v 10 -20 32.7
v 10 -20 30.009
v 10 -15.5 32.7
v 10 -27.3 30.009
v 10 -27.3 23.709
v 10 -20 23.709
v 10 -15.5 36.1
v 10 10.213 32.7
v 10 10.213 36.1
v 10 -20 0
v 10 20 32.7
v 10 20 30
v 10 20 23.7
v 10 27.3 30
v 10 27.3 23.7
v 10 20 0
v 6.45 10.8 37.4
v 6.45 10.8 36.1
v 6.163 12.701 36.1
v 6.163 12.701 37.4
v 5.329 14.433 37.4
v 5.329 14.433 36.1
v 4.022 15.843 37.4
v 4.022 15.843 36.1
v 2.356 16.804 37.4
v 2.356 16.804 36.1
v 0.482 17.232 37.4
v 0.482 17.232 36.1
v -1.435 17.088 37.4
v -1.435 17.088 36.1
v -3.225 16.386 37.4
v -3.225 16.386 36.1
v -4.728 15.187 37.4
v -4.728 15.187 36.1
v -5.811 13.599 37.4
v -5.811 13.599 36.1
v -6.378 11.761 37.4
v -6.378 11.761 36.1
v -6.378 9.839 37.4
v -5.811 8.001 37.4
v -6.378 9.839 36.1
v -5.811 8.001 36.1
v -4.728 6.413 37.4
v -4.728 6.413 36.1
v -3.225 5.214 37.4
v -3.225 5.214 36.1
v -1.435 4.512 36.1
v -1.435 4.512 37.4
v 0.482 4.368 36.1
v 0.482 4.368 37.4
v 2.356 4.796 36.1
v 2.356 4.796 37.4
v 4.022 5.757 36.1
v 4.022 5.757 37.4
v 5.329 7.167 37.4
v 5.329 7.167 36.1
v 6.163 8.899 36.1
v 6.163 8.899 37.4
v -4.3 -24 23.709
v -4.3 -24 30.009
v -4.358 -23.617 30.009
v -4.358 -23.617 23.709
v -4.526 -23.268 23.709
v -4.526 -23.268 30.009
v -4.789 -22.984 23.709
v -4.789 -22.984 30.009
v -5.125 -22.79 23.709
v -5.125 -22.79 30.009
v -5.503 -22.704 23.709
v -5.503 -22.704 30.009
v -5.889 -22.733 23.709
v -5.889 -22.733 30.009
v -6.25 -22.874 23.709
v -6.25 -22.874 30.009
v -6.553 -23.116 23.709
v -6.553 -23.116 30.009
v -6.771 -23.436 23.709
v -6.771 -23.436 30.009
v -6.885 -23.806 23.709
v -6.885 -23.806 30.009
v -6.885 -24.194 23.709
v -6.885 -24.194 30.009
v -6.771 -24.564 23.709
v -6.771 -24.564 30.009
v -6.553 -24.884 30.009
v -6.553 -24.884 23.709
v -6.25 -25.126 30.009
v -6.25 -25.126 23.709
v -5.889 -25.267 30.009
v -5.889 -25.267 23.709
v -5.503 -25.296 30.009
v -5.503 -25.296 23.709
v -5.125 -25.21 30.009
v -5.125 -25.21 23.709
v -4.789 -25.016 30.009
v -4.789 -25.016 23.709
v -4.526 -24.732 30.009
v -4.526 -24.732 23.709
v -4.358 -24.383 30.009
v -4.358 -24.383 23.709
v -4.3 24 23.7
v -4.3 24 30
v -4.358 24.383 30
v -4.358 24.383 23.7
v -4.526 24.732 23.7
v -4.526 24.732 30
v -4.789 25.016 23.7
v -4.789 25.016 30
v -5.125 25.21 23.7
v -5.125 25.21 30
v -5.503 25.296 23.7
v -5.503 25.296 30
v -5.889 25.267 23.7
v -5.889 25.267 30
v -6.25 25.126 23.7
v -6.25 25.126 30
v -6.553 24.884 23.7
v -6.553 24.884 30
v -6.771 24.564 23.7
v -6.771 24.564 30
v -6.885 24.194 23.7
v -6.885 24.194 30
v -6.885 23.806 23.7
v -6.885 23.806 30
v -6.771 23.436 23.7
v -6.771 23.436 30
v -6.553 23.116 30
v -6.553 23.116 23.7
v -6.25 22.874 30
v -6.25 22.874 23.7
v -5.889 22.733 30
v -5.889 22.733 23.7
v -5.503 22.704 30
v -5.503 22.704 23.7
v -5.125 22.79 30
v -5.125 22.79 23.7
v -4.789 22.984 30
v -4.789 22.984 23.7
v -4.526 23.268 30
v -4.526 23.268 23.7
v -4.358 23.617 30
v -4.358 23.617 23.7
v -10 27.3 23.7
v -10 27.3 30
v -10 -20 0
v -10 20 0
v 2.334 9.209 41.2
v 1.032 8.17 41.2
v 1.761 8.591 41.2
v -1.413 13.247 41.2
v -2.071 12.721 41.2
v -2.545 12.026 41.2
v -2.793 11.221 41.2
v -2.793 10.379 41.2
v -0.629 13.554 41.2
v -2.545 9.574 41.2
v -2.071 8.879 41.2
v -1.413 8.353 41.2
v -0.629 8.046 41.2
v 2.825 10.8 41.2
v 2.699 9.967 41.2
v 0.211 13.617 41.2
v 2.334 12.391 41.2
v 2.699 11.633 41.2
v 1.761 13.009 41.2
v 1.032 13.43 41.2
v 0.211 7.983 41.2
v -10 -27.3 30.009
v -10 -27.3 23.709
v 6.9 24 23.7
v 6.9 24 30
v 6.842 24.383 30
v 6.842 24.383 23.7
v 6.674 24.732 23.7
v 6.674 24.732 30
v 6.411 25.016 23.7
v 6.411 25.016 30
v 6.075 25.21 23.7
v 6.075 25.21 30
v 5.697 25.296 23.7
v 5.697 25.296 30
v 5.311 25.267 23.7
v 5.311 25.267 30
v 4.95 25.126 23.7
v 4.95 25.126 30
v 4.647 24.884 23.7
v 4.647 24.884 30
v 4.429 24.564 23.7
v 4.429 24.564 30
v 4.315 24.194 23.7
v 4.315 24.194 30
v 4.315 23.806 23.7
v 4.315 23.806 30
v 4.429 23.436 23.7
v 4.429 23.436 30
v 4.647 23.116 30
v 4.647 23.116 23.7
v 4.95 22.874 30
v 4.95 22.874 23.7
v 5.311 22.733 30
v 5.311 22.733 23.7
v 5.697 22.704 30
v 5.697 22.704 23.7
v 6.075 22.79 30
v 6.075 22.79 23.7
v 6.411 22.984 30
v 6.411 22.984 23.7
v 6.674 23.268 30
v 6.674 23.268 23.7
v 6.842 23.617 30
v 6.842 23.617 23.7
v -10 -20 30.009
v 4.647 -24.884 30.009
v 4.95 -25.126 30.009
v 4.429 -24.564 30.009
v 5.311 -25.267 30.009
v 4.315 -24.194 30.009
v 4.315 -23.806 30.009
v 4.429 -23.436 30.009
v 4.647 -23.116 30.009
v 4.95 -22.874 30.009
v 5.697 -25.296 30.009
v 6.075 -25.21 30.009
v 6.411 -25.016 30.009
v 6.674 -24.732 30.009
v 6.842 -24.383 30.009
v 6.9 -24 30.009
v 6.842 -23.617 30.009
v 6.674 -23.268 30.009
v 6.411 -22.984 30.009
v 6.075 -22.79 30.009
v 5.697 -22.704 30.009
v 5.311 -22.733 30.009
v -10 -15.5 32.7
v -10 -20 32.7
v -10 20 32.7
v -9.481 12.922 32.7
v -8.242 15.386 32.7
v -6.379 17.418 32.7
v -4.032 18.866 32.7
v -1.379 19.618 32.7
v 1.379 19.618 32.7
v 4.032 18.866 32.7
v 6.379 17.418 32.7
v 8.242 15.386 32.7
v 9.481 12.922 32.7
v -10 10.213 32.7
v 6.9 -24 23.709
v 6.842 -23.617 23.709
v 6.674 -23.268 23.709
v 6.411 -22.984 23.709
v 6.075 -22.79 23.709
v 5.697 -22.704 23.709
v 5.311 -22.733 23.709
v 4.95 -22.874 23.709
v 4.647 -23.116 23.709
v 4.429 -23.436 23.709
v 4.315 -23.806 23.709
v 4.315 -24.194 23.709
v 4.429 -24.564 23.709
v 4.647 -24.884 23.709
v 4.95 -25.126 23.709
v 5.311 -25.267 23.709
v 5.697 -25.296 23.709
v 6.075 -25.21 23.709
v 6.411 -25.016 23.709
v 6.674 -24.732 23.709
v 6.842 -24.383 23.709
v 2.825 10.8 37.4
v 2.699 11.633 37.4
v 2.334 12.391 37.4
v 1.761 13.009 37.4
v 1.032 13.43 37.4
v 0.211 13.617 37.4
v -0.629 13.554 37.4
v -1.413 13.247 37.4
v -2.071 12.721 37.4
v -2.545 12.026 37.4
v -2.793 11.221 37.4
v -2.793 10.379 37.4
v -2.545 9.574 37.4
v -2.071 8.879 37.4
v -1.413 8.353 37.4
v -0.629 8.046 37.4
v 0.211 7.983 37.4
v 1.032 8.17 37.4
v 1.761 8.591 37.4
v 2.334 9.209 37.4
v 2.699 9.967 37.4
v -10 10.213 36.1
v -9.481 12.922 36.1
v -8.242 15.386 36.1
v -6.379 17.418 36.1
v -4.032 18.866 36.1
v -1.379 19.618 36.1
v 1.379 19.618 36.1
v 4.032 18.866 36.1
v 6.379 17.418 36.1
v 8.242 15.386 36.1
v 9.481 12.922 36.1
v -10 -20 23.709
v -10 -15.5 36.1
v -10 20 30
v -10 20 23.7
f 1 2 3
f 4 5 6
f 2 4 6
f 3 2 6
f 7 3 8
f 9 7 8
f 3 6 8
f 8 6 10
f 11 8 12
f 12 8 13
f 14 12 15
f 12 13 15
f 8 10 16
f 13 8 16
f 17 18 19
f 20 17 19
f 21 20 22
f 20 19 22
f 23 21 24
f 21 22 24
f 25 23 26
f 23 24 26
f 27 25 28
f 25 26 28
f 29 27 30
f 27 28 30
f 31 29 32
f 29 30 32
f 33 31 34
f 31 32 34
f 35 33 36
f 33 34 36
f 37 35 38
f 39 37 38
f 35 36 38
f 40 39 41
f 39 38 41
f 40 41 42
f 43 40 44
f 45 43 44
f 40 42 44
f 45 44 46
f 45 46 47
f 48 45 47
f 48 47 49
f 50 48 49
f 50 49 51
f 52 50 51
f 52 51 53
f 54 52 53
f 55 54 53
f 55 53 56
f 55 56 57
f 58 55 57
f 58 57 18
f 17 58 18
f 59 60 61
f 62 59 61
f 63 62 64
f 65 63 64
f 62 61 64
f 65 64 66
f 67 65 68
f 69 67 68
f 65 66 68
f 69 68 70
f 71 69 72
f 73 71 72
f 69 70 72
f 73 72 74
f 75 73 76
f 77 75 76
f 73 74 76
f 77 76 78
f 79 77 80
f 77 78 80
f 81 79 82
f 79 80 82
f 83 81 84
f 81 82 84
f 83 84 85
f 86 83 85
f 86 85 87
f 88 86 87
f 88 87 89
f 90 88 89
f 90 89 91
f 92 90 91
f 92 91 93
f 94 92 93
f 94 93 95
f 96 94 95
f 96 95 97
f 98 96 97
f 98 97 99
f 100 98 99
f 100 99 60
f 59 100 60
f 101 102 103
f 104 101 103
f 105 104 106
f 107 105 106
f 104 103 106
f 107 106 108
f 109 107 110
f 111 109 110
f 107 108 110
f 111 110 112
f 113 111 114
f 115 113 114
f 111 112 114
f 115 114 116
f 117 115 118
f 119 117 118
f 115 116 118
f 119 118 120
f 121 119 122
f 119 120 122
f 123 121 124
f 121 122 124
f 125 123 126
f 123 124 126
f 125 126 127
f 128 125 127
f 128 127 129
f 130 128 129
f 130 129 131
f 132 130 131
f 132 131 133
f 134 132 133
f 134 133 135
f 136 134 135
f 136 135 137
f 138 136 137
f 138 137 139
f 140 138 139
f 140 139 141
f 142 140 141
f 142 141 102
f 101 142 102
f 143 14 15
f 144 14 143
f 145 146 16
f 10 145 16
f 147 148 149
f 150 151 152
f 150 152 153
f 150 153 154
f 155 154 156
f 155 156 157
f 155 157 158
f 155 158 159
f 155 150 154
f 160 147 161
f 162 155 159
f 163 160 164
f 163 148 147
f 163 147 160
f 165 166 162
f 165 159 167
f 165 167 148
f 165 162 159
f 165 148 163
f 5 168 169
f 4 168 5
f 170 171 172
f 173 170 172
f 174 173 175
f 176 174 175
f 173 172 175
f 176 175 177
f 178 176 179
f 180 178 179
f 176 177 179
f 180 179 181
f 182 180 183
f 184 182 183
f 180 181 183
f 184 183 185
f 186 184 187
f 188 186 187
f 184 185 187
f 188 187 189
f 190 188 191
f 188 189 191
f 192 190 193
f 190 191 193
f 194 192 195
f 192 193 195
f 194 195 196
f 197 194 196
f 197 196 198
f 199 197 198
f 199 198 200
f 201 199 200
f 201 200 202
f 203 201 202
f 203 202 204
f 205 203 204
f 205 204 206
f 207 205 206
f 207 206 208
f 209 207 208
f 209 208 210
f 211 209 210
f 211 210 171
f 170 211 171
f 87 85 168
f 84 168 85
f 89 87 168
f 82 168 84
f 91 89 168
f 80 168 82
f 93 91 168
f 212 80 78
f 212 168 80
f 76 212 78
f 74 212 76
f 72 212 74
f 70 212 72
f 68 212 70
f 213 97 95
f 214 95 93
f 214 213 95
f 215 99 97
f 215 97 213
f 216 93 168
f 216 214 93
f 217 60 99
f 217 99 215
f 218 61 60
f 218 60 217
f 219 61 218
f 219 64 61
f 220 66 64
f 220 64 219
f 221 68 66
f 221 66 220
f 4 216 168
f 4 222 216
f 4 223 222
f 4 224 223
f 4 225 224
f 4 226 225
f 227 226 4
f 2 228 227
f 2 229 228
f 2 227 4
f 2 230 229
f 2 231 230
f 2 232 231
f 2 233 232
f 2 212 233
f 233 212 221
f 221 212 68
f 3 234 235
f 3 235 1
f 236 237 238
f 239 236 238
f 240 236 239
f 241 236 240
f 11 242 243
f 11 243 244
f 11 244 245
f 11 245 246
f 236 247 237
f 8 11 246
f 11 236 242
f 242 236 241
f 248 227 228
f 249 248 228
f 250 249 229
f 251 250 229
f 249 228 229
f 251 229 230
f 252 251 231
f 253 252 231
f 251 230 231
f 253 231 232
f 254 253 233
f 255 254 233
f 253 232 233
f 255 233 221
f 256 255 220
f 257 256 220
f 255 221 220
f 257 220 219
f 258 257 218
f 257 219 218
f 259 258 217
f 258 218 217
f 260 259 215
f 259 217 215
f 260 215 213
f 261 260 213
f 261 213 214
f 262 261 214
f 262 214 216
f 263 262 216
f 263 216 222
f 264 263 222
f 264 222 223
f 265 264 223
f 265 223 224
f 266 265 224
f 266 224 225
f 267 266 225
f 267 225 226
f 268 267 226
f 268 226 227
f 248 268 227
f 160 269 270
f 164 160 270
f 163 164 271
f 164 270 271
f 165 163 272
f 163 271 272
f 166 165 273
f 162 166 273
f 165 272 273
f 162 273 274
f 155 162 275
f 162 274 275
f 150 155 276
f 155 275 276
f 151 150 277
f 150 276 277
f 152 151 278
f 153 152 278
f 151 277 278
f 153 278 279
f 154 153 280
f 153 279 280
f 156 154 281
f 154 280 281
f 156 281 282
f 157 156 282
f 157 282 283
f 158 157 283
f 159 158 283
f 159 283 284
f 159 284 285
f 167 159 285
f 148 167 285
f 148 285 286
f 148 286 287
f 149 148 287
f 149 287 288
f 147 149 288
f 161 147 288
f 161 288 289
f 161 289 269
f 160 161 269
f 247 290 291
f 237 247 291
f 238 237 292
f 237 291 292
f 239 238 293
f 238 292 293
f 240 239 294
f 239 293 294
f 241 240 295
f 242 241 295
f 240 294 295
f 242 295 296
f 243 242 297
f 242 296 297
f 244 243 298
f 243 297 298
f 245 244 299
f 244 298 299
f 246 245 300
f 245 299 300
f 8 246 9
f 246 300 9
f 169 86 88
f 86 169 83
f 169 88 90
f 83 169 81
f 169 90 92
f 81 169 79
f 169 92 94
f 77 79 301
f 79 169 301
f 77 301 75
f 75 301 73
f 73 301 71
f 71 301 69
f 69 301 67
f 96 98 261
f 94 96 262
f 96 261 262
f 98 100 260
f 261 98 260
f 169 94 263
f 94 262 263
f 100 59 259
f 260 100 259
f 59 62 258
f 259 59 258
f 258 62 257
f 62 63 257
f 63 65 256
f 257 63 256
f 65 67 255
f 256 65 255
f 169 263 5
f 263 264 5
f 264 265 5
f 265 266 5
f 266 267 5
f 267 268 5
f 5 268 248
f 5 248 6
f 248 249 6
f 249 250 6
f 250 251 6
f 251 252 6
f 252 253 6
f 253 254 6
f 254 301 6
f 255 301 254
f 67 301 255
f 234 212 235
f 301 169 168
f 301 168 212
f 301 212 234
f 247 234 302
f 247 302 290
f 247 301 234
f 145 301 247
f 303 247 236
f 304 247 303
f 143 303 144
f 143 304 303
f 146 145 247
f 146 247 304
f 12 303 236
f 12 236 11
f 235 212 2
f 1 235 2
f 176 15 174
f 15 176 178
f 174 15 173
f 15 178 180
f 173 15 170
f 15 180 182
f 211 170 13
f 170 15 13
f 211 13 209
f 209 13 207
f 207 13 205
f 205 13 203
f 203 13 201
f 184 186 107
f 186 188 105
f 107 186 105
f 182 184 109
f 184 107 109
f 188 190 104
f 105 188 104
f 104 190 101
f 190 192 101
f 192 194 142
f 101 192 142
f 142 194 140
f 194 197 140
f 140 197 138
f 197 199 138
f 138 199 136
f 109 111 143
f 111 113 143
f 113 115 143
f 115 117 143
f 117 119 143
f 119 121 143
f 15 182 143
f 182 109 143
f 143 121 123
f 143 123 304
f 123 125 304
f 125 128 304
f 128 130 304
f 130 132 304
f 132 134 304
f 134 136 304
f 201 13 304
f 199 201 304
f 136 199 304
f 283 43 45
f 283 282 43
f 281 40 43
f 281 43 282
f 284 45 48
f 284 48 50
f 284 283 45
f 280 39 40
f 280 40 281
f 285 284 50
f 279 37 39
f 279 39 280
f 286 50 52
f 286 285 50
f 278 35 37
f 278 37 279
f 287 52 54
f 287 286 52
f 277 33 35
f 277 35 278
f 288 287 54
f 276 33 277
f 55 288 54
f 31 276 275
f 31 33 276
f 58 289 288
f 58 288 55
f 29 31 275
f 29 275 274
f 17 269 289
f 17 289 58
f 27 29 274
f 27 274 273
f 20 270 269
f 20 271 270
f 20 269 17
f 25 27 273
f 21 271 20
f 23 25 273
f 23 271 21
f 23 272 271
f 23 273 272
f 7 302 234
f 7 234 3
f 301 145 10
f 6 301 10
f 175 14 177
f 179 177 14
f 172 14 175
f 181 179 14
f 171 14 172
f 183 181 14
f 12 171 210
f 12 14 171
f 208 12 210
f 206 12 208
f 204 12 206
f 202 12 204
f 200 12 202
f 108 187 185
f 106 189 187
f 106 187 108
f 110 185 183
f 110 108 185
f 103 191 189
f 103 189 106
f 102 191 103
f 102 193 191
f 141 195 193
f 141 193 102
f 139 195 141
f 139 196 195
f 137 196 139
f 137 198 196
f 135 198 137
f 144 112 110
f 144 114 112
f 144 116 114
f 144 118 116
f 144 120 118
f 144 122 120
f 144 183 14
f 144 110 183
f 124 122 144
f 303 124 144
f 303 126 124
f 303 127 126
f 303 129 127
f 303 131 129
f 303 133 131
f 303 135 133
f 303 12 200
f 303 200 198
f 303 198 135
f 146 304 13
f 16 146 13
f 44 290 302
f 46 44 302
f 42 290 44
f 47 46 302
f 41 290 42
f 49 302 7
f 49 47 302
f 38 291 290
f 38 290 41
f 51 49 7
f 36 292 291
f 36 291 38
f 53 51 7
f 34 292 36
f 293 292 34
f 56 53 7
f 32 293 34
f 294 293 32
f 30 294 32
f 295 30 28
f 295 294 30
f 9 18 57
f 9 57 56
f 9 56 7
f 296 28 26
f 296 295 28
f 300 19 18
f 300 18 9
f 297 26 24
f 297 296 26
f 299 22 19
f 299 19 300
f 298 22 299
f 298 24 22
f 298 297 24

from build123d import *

# Parameters (mm, degrees)
F0_W      = 20
F0_H      = 40
F0_R      = 6.45
F0_R_2    = 2.825
F1_DEPTH  = 36.1
F2_W      = 20
F2_H      = 6.3
F3_DEPTH  = 7.3
F4_W      = 20
F4_H      = 6.3
F5_DEPTH  = 7.3
F6_DEPTH  = 41.2
F7_DEPTH  = 37.4
F9_W      = 20
F9_H      = 4.5
F10_DEPTH = 3.4
F8_R      = 1.3
F11_DEPTH = 8


with BuildPart() as f1:
    # F0 (on Top) → F1 (new body)
    with BuildSketch(Plane.XY):
        Rectangle(F0_W, F0_H)
        with Locations((0, 10.8)):
            Circle(F0_R, mode=Mode.SUBTRACT)
        with Locations((0, 10.8)):
            Circle(F0_R)
        with Locations((0, 10.8)):
            Circle(F0_R_2, mode=Mode.SUBTRACT)
        with Locations((0, 10.8)):
            Circle(F0_R_2)
    extrude(amount=F1_DEPTH)

    # F2 (on face) → F3 (join)
    with BuildSketch(Plane(origin=(0, 20, 0), x_dir=(-1, 0, 0), z_dir=(0, 1, 0))):
        with Locations((0, 26.85)):
            Rectangle(F2_W, F2_H)
    extrude(amount=F3_DEPTH)

    # F4 (on face) → F5 (join)
    with BuildSketch(Plane.XZ.offset(20)):
        with Locations((0, 26.858872)):
            Rectangle(F4_W, F4_H)
    extrude(amount=F5_DEPTH)

    # F0 (on Top) → F6 (join)
    with BuildSketch(Plane.XY):
        with Locations((0, 10.8)):
            Circle(F0_R_2)
    extrude(amount=F6_DEPTH)

    # F0 (on Top) → F7 (join)
    with BuildSketch(Plane.XY):
        with Locations((0, 10.8)):
            Circle(F0_R)
        with Locations((0, 10.8)):
            Circle(F0_R_2, mode=Mode.SUBTRACT)
    extrude(amount=F7_DEPTH)

    # F9 (on face) → F10 (cut)
    with BuildSketch(Plane.XY.offset(36.1)):
        with BuildLine():
            Line((-10, 20), (-10, 10.213363))
            ThreePointArc((-10, 10.213363), (-4e-06, 19.71317), (10, 10.213371))
            Line((10, 10.213371), (10, 20))
            Line((10, 20), (-10, 20))
        make_face()
        with Locations((0, -17.75)):
            Rectangle(F9_W, F9_H)
    extrude(amount=-F10_DEPTH, mode=Mode.SUBTRACT)

    # F8 (on face) → F11 (cut)
    with BuildSketch(Plane.XY.offset(30.008872)):
        with Locations((5.6, -24)):
            Circle(F8_R)
        with Locations((-5.6, -24)):
            Circle(F8_R)
        with Locations((5.6, 24)):
            Circle(F8_R)
        with Locations((-5.6, 24)):
            Circle(F8_R)
    extrude(amount=-F11_DEPTH, mode=Mode.SUBTRACT)


solid = f1.part
